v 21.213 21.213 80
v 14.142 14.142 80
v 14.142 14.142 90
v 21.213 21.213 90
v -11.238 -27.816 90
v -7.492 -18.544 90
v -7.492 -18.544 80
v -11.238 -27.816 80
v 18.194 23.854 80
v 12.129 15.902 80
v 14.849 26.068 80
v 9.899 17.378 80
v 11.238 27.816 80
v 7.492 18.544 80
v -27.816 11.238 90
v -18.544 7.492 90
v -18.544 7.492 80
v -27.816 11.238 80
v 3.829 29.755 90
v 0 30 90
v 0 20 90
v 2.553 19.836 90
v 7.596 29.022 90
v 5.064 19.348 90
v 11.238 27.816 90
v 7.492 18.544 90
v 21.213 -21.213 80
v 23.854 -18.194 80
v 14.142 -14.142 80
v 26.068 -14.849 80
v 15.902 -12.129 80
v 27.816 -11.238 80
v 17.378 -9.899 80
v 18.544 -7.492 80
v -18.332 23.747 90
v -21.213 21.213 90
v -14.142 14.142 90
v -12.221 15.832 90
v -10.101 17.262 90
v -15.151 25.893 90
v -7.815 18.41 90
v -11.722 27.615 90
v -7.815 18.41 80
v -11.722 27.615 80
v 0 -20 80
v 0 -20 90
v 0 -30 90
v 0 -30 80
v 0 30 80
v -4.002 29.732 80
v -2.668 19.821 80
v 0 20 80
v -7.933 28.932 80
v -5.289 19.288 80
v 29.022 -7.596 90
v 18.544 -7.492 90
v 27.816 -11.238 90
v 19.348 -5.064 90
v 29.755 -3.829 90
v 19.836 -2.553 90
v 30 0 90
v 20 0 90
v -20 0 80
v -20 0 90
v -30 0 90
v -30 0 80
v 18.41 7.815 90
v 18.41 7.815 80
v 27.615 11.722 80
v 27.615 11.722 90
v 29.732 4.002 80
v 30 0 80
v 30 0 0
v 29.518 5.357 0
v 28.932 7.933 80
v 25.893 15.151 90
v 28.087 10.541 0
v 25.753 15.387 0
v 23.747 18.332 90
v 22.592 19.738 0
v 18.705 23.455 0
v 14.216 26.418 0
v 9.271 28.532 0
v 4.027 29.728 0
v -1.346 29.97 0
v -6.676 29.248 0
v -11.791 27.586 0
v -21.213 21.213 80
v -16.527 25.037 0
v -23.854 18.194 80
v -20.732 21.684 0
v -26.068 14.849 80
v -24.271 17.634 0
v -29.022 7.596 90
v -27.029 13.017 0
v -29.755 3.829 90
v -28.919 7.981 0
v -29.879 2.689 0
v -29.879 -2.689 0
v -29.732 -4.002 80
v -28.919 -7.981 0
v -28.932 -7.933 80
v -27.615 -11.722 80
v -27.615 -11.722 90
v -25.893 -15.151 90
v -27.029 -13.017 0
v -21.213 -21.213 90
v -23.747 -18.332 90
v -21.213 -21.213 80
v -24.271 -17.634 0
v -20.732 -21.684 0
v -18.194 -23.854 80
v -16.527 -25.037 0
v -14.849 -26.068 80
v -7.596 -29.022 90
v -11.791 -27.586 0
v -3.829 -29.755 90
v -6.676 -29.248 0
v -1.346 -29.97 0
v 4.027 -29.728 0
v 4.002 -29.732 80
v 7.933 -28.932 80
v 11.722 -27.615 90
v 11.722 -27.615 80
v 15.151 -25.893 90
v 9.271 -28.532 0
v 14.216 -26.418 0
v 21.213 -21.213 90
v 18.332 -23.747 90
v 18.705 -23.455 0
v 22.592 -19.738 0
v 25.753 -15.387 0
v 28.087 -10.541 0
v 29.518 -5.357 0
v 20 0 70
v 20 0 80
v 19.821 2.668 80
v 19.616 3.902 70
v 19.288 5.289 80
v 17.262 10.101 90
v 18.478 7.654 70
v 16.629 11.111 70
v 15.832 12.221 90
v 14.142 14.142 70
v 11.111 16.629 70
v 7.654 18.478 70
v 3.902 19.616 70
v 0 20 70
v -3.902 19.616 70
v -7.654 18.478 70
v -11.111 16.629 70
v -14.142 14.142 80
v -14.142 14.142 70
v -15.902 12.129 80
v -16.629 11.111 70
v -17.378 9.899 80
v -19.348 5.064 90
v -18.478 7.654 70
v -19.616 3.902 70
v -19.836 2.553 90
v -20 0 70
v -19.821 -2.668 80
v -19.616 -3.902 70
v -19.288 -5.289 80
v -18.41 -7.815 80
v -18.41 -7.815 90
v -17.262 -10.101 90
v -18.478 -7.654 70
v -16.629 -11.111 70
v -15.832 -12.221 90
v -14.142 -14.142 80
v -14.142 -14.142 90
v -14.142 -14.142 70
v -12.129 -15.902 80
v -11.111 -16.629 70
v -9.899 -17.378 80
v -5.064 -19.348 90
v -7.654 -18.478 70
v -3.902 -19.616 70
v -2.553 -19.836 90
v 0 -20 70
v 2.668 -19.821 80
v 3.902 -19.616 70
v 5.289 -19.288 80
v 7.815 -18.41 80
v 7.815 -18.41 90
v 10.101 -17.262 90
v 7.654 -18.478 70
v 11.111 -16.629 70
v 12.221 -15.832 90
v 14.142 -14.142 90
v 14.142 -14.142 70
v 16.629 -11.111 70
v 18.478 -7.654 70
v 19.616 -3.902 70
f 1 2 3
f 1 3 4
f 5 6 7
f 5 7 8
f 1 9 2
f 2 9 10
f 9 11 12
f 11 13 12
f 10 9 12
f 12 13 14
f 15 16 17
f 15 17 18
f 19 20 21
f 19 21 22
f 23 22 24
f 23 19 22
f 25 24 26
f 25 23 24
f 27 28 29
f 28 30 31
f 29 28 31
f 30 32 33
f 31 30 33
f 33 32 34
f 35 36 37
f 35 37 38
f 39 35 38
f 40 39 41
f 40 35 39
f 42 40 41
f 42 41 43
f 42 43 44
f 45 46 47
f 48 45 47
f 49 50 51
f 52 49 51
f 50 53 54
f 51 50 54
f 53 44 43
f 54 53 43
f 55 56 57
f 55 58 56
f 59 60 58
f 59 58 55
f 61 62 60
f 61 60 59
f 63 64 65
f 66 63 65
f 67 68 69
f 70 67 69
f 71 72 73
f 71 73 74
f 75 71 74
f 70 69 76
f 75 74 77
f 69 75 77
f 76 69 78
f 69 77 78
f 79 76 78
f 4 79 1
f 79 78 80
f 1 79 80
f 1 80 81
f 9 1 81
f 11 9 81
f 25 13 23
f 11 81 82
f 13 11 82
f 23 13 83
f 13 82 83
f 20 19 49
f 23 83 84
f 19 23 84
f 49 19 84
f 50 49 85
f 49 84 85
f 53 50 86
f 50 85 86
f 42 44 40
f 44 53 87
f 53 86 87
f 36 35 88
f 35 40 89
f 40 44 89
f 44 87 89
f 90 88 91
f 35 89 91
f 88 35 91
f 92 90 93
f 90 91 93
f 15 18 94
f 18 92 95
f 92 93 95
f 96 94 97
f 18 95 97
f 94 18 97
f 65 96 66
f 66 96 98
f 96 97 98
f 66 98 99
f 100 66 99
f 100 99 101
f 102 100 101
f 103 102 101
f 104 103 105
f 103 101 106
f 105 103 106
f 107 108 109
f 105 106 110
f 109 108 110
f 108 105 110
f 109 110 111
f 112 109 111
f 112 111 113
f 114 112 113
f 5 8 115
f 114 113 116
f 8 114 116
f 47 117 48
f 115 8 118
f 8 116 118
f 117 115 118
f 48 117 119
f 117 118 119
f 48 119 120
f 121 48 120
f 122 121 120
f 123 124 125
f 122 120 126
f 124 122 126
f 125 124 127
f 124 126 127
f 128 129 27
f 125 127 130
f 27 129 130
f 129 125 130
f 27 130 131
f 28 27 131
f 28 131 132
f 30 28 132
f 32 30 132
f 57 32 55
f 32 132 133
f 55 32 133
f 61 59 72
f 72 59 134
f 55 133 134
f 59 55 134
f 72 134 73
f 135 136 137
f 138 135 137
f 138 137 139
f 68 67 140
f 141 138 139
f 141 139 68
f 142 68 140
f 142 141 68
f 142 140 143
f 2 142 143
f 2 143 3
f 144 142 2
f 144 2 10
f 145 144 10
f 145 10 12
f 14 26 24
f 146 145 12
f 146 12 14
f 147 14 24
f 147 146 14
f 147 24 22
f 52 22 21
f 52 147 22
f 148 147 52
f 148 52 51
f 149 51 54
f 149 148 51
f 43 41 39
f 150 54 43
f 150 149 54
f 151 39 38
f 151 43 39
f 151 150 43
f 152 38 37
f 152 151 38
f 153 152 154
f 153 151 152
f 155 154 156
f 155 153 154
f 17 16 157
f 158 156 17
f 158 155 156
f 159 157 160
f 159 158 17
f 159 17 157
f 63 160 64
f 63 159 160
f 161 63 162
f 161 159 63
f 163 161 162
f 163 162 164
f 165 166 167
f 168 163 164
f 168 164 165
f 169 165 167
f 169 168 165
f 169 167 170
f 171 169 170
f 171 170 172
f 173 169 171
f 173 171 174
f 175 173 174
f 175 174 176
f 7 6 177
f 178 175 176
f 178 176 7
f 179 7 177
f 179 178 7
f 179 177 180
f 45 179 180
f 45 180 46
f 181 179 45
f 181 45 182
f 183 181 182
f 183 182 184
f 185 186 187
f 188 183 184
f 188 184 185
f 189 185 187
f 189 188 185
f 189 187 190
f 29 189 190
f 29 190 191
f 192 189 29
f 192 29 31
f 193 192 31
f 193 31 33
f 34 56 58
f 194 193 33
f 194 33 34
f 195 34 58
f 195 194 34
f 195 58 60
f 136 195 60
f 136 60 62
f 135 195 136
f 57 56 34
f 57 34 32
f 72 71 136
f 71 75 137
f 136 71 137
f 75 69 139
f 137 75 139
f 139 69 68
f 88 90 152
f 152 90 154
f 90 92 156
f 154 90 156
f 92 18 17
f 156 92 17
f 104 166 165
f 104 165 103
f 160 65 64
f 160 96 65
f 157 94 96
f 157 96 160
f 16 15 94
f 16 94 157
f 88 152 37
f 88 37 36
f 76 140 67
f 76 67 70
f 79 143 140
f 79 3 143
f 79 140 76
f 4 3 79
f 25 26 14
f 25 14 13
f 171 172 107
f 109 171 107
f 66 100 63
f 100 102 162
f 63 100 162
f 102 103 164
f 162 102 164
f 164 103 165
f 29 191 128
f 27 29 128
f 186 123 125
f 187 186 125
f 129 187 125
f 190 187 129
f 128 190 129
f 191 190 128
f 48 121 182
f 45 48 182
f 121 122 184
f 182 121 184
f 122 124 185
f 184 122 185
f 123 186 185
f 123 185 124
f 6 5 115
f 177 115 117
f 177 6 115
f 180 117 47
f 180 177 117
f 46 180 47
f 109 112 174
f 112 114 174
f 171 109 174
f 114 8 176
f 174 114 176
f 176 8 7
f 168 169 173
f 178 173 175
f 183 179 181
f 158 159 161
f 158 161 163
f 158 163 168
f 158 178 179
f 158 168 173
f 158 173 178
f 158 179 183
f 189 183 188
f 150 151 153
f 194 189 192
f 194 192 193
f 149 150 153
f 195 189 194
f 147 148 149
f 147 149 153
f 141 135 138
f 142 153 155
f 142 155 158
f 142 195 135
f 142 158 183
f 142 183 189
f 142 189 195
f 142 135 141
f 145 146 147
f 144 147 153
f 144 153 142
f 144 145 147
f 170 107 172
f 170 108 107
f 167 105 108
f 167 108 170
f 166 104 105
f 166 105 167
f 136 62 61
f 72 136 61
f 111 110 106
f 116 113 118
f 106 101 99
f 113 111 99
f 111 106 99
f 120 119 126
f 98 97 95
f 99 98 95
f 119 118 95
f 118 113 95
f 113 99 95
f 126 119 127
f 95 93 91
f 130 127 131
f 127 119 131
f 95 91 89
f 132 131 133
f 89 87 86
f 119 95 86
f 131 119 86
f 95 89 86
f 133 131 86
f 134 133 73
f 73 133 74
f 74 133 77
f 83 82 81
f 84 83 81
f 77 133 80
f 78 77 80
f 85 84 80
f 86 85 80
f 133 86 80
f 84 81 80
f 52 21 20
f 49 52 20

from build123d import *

# Parameters (mm, degrees)
CYLINDER002_R     = 20
CYLINDER002_DEPTH = 20
CYLINDER001_W     = 30
CYLINDER001_H     = 10
CYLINDER001_ANGLE = 23
ARRAY_COUNT       = 8
CYLINDER_R        = 30
CYLINDER_DEPTH    = 90


with BuildPart() as cylinder002:
    # Cylinder002 → Cylinder002 (new body)
    with BuildSketch(Plane.XY.offset(70)):
        Circle(CYLINDER002_R)
    extrude(amount=CYLINDER002_DEPTH)


with BuildPart() as array:
    # Cylinder001 → Cylinder001 (revolve)
    with BuildSketch(Plane(origin=(0, 0, 80), x_dir=(1, 0, 0), z_dir=(0, -1, 0))):
        with Locations((15, 5)):
            Rectangle(CYLINDER001_W, CYLINDER001_H)
    revolve(axis=Axis((0, 0, 80), (0, 0, 1)), revolution_arc=CYLINDER001_ANGLE)

    # Array: Array ×8 about axis
    array_axis = Axis((0, 0, 0), (0, 0, 1))


with BuildPart() as array_1:
    add(array.part)
    for i in range(1, ARRAY_COUNT):
        add(array.part.rotate(array_axis, i * 360 / ARRAY_COUNT))


with BuildPart() as cut001:
    # Cylinder → Cylinder (new body)
    with BuildSketch(Plane.XY):
        Circle(CYLINDER_R)
    extrude(amount=CYLINDER_DEPTH)

    # Cut: cut Array
    add(array_1.part, mode=Mode.SUBTRACT)

    # Cut001: cut Cylinder002
    add(cylinder002.part, mode=Mode.SUBTRACT)


solid = cut001.part
